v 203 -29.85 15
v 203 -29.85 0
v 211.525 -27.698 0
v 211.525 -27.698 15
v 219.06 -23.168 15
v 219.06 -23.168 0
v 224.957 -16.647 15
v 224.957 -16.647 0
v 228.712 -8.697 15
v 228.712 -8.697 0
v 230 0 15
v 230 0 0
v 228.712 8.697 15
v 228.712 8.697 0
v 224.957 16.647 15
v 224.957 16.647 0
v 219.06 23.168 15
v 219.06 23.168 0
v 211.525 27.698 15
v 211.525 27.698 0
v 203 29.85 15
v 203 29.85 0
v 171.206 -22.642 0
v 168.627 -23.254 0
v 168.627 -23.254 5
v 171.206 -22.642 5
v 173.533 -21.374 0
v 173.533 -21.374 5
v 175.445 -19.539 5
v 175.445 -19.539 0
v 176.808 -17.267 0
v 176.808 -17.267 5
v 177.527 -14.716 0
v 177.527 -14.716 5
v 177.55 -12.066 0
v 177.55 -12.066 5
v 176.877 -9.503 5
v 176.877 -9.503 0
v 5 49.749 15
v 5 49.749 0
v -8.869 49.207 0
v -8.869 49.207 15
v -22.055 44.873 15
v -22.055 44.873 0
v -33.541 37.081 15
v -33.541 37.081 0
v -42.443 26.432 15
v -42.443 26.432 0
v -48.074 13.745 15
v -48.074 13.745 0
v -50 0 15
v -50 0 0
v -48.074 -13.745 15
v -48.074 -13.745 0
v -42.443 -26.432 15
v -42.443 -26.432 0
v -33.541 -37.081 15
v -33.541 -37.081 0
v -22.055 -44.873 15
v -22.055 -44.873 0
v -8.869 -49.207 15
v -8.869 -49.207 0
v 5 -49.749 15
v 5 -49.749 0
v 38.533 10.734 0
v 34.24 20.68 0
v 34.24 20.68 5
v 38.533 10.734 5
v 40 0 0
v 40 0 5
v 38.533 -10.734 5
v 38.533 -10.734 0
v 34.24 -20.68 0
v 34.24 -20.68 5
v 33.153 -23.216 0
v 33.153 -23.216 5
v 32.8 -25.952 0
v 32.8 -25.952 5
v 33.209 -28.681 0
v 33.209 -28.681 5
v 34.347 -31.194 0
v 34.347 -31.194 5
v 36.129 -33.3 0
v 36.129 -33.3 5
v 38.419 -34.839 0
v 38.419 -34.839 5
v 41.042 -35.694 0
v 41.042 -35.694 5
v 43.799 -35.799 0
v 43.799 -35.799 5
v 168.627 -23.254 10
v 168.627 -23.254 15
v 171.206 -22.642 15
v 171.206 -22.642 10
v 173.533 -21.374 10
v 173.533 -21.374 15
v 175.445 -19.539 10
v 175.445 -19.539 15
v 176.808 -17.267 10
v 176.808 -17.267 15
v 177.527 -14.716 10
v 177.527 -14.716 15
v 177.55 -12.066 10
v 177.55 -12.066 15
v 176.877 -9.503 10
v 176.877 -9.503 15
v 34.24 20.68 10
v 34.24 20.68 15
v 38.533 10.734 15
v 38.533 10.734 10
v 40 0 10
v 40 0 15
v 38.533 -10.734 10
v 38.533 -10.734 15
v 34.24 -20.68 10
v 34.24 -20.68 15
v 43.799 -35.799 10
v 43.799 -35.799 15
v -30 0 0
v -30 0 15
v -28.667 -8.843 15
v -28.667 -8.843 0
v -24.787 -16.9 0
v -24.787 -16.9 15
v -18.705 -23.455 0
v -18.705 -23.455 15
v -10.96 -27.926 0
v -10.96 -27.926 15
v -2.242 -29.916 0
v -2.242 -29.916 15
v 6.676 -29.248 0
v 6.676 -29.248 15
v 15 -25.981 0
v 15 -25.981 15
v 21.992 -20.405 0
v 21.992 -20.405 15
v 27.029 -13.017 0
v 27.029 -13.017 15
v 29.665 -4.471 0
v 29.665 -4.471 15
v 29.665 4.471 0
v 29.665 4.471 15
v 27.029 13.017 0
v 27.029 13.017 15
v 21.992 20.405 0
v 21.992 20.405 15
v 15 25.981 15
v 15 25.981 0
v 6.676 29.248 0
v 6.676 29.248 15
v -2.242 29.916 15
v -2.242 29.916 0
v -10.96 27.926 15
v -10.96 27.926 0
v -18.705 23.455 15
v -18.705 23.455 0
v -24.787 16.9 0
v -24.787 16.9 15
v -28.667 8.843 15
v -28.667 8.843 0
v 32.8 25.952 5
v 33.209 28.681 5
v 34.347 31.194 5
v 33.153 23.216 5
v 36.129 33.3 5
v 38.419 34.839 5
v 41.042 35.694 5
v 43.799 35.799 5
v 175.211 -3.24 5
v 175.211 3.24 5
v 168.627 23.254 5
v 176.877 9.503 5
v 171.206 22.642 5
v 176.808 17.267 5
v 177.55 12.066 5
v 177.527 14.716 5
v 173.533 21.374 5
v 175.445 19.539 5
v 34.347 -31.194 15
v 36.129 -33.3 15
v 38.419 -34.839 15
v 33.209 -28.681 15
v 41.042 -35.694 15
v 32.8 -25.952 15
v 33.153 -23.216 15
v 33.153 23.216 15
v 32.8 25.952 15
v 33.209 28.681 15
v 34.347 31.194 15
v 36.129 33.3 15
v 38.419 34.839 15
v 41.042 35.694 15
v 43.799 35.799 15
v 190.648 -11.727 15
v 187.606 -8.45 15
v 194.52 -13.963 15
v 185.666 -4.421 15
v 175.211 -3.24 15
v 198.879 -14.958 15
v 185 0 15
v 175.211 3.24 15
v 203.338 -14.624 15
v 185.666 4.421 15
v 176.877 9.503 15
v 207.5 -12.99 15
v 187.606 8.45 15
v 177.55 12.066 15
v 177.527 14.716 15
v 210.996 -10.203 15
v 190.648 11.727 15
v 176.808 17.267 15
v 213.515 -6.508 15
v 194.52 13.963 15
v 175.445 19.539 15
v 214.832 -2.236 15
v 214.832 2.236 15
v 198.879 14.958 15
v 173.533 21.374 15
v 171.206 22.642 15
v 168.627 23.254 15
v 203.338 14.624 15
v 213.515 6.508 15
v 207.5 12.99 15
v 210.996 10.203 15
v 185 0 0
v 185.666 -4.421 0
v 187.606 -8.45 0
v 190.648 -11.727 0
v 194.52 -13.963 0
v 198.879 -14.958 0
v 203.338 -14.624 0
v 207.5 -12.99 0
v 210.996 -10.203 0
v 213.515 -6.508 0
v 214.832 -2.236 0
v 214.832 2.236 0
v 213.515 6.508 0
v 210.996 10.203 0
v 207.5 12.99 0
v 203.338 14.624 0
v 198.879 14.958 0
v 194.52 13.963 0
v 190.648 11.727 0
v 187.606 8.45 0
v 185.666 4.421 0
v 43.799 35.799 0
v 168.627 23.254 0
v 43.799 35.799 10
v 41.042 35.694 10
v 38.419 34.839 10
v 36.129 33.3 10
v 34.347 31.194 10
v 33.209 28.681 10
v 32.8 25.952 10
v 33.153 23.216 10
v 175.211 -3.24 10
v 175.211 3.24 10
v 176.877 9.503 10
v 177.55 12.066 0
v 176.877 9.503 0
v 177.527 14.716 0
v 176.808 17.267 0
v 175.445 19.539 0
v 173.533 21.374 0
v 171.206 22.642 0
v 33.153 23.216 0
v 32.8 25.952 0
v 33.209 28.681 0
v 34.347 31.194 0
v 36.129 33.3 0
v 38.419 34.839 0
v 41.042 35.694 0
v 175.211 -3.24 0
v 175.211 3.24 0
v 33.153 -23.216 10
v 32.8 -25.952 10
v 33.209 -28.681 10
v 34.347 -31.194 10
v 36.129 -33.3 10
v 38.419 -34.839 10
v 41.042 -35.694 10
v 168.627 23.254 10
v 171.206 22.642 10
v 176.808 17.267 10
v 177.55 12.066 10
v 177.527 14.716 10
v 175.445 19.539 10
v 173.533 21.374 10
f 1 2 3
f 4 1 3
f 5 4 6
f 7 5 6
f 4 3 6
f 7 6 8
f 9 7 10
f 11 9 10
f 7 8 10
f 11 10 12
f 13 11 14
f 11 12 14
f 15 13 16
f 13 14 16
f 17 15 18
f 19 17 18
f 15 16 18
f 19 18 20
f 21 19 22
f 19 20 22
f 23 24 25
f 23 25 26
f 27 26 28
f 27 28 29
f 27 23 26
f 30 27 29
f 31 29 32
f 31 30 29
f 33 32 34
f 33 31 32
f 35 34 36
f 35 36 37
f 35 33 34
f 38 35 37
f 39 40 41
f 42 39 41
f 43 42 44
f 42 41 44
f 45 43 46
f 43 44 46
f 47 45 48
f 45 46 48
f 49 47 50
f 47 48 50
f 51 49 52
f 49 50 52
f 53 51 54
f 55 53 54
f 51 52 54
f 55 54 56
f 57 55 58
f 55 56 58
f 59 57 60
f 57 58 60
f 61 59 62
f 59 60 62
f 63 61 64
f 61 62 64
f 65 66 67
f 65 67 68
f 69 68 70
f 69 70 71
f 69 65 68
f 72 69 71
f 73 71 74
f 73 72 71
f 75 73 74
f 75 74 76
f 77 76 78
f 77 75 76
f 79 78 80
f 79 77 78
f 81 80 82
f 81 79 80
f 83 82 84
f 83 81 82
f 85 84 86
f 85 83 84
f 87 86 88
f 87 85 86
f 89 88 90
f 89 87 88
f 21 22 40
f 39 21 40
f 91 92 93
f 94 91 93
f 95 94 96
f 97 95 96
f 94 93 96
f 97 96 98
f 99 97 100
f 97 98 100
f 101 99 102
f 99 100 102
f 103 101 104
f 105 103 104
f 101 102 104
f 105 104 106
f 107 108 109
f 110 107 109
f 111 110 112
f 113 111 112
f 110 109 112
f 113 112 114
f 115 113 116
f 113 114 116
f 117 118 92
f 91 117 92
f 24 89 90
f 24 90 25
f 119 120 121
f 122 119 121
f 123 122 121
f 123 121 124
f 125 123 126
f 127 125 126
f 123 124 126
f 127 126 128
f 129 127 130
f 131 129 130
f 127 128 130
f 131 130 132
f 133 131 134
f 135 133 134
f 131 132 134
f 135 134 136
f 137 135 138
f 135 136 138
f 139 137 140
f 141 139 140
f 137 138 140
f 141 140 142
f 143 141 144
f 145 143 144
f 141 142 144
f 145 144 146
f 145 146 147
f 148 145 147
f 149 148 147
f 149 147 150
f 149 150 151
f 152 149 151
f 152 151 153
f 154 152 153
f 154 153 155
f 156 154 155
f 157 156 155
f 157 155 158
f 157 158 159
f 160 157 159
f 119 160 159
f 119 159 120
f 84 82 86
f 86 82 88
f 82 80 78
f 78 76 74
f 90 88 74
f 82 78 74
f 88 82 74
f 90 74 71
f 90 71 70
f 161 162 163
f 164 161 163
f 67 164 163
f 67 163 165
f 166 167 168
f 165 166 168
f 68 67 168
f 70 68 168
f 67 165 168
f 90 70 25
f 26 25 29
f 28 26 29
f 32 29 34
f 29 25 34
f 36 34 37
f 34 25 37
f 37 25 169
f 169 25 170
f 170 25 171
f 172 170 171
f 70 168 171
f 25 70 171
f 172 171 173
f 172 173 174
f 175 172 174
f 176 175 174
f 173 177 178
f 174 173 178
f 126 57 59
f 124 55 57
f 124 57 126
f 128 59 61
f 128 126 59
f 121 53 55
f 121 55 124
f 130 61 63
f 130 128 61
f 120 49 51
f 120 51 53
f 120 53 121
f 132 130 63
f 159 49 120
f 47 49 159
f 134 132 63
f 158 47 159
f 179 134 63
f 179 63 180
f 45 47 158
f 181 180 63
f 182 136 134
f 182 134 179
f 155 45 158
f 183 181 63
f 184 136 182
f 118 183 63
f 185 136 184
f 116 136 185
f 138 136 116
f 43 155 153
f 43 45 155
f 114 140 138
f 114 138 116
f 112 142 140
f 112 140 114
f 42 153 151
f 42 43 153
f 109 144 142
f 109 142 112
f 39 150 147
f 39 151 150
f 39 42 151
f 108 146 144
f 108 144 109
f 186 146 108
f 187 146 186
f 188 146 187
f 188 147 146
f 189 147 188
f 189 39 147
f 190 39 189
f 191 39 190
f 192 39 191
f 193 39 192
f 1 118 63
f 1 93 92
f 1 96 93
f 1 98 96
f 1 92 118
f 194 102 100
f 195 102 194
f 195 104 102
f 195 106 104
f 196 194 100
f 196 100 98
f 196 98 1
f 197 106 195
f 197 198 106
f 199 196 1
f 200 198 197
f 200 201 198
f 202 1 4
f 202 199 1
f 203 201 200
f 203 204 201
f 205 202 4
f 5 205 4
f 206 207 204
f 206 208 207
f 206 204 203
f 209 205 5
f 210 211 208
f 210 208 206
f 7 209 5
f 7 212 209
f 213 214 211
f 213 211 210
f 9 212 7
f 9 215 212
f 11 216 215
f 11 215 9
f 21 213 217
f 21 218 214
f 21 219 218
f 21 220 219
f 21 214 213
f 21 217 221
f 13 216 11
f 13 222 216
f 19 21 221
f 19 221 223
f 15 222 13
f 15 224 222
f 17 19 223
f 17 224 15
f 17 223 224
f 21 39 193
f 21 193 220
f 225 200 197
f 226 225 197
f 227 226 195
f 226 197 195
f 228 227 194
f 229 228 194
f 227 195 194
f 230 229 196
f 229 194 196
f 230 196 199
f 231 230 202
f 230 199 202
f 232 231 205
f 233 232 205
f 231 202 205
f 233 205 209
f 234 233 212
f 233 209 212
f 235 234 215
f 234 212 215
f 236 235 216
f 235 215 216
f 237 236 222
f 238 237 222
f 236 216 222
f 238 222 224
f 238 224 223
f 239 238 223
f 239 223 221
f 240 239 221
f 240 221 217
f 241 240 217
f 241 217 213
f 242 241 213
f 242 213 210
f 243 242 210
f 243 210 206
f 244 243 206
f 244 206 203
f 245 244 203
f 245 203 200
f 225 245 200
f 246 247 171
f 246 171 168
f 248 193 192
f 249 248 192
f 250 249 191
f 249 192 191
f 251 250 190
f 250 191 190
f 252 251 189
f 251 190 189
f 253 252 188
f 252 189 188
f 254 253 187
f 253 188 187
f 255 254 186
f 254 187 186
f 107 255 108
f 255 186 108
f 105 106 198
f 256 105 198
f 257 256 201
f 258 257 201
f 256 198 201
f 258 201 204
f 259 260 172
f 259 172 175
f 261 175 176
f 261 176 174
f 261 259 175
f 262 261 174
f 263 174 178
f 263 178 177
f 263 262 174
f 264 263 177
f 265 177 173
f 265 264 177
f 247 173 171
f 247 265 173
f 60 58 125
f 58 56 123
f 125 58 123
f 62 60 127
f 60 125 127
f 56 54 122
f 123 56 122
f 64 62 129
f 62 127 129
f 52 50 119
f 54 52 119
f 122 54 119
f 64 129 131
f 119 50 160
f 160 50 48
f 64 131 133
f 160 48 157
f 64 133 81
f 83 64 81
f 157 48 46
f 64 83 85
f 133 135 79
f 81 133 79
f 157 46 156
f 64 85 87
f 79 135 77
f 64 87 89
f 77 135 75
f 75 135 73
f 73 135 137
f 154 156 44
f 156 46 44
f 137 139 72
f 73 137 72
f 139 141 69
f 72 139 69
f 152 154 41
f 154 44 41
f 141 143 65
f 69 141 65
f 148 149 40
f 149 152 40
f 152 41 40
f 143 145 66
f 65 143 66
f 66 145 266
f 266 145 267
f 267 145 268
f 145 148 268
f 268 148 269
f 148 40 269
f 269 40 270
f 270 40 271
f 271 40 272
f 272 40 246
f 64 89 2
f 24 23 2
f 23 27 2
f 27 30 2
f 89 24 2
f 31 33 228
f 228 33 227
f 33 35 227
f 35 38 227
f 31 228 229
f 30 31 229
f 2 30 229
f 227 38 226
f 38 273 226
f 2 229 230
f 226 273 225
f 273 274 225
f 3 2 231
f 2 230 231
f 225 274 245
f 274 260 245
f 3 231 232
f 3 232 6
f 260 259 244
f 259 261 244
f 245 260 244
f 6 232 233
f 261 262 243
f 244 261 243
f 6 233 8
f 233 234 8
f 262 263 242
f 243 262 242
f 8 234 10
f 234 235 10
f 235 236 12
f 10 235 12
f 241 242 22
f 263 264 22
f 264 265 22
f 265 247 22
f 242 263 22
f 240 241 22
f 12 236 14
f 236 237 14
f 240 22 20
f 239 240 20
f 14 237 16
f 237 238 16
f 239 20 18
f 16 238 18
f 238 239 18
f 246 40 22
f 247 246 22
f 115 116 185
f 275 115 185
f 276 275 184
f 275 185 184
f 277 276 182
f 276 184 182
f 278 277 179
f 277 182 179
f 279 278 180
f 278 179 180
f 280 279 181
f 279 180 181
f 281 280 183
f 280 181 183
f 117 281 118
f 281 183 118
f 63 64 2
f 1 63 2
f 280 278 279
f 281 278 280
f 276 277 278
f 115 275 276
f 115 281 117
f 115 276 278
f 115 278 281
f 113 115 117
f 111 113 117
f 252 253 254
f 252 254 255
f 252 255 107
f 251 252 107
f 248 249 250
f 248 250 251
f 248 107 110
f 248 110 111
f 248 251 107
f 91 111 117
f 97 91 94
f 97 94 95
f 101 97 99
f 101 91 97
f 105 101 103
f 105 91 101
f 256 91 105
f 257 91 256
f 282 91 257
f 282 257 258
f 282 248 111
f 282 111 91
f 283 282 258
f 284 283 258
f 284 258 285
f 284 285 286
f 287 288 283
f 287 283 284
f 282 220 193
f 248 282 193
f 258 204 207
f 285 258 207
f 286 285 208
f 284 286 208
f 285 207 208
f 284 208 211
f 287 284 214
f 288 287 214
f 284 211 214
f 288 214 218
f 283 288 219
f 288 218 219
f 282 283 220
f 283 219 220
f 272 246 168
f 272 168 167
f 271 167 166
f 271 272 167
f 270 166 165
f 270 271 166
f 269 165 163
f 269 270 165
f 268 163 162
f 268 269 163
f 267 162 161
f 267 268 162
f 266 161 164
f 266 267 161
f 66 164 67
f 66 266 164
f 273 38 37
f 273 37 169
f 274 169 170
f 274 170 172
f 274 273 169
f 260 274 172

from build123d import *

# Parameters (mm, degrees)
F1_DEPTH = 15
F3_D     = 60
F4_D     = 30
F6_DEPTH = 5
F8_DEPTH = 5


with BuildPart() as f1:
    # F0 (on Top) → F1 (new body)
    with BuildSketch(Plane.XY):
        with BuildLine():
            Line((203, 29.8496231132), (5, 49.7493718553))
            ThreePointArc((5, 49.7493718553), (-50, 0), (5, -49.7493718553))
            Line((5, -49.7493718553), (203, -29.8496231132))
            ThreePointArc((203, -29.8496231132), (230, 0), (203, 29.8496231132))
        make_face()
    extrude(amount=F1_DEPTH)

    # F3 (through all)
    with Locations(Plane(origin=(0, 0, 0), x_dir=(1, 0, 0), z_dir=(0, 0, -1))):
        with Locations((0, 0)):
            Hole(F3_D / 2)

    # F4 (through all)
    with Locations(Plane(origin=(0, 0, 0), x_dir=(1, 0, 0), z_dir=(0, 0, -1))):
        with Locations((200, 0)):
            Hole(F4_D / 2)

    # F5 (on face) → F6 (cut)
    with BuildSketch(Plane.XY.offset(15)):
        with BuildLine():
            Line((168.6271068081, 23.2538507084), (43.7994974843, 35.7994974843))
            ThreePointArc((43.7994974843, 35.7994974843), (34.3472728952, 31.1937693965), (34.2395979874, 20.6796984906))
            ThreePointArc((34.2395979874, 20.6796984906), (40, 0), (34.2395979874, -20.6796984906))
            ThreePointArc((34.2395979874, -20.6796984906), (34.3472728952, -31.1937693965), (43.7994974843, -35.7994974843))
            Line((43.7994974843, -35.7994974843), (168.6271068081, -23.2538507084))
            ThreePointArc((168.6271068081, -23.2538507084), (176.2023684566, -18.4483798654), (176.8765048629, -9.5028402409))
            ThreePointArc((176.8765048629, -9.5028402409), (175, 0), (176.8765048629, 9.5028402409))
            ThreePointArc((176.8765048629, 9.5028402409), (176.2023684566, 18.4483798654), (168.6271068081, 23.2538507084))
        make_face()
    extrude(amount=-F6_DEPTH, mode=Mode.SUBTRACT)

    # F7 (on Top) → F8 (cut)
    with BuildSketch(Plane.XY):
        with BuildLine():
            Line((168.6271068081, 23.2538507084), (43.7994974843, 35.7994974843))
            ThreePointArc((43.7994974843, 35.7994974843), (34.3472728952, 31.1937693965), (34.2395979874, 20.6796984906))
            ThreePointArc((34.2395979874, 20.6796984906), (40, 0), (34.2395979874, -20.6796984906))
            ThreePointArc((34.2395979874, -20.6796984906), (34.3472728952, -31.1937693965), (43.7994974843, -35.7994974843))
            Line((43.7994974843, -35.7994974843), (168.6271068081, -23.2538507084))
            ThreePointArc((168.6271068081, -23.2538507084), (176.2023684566, -18.4483798654), (176.8765048629, -9.5028402409))
            ThreePointArc((176.8765048629, -9.5028402409), (175, 0), (176.8765048629, 9.5028402409))
            ThreePointArc((176.8765048629, 9.5028402409), (176.2023684566, 18.4483798654), (168.6271068081, 23.2538507084))
        make_face()
    extrude(amount=F8_DEPTH, mode=Mode.SUBTRACT)


solid = f1.part
